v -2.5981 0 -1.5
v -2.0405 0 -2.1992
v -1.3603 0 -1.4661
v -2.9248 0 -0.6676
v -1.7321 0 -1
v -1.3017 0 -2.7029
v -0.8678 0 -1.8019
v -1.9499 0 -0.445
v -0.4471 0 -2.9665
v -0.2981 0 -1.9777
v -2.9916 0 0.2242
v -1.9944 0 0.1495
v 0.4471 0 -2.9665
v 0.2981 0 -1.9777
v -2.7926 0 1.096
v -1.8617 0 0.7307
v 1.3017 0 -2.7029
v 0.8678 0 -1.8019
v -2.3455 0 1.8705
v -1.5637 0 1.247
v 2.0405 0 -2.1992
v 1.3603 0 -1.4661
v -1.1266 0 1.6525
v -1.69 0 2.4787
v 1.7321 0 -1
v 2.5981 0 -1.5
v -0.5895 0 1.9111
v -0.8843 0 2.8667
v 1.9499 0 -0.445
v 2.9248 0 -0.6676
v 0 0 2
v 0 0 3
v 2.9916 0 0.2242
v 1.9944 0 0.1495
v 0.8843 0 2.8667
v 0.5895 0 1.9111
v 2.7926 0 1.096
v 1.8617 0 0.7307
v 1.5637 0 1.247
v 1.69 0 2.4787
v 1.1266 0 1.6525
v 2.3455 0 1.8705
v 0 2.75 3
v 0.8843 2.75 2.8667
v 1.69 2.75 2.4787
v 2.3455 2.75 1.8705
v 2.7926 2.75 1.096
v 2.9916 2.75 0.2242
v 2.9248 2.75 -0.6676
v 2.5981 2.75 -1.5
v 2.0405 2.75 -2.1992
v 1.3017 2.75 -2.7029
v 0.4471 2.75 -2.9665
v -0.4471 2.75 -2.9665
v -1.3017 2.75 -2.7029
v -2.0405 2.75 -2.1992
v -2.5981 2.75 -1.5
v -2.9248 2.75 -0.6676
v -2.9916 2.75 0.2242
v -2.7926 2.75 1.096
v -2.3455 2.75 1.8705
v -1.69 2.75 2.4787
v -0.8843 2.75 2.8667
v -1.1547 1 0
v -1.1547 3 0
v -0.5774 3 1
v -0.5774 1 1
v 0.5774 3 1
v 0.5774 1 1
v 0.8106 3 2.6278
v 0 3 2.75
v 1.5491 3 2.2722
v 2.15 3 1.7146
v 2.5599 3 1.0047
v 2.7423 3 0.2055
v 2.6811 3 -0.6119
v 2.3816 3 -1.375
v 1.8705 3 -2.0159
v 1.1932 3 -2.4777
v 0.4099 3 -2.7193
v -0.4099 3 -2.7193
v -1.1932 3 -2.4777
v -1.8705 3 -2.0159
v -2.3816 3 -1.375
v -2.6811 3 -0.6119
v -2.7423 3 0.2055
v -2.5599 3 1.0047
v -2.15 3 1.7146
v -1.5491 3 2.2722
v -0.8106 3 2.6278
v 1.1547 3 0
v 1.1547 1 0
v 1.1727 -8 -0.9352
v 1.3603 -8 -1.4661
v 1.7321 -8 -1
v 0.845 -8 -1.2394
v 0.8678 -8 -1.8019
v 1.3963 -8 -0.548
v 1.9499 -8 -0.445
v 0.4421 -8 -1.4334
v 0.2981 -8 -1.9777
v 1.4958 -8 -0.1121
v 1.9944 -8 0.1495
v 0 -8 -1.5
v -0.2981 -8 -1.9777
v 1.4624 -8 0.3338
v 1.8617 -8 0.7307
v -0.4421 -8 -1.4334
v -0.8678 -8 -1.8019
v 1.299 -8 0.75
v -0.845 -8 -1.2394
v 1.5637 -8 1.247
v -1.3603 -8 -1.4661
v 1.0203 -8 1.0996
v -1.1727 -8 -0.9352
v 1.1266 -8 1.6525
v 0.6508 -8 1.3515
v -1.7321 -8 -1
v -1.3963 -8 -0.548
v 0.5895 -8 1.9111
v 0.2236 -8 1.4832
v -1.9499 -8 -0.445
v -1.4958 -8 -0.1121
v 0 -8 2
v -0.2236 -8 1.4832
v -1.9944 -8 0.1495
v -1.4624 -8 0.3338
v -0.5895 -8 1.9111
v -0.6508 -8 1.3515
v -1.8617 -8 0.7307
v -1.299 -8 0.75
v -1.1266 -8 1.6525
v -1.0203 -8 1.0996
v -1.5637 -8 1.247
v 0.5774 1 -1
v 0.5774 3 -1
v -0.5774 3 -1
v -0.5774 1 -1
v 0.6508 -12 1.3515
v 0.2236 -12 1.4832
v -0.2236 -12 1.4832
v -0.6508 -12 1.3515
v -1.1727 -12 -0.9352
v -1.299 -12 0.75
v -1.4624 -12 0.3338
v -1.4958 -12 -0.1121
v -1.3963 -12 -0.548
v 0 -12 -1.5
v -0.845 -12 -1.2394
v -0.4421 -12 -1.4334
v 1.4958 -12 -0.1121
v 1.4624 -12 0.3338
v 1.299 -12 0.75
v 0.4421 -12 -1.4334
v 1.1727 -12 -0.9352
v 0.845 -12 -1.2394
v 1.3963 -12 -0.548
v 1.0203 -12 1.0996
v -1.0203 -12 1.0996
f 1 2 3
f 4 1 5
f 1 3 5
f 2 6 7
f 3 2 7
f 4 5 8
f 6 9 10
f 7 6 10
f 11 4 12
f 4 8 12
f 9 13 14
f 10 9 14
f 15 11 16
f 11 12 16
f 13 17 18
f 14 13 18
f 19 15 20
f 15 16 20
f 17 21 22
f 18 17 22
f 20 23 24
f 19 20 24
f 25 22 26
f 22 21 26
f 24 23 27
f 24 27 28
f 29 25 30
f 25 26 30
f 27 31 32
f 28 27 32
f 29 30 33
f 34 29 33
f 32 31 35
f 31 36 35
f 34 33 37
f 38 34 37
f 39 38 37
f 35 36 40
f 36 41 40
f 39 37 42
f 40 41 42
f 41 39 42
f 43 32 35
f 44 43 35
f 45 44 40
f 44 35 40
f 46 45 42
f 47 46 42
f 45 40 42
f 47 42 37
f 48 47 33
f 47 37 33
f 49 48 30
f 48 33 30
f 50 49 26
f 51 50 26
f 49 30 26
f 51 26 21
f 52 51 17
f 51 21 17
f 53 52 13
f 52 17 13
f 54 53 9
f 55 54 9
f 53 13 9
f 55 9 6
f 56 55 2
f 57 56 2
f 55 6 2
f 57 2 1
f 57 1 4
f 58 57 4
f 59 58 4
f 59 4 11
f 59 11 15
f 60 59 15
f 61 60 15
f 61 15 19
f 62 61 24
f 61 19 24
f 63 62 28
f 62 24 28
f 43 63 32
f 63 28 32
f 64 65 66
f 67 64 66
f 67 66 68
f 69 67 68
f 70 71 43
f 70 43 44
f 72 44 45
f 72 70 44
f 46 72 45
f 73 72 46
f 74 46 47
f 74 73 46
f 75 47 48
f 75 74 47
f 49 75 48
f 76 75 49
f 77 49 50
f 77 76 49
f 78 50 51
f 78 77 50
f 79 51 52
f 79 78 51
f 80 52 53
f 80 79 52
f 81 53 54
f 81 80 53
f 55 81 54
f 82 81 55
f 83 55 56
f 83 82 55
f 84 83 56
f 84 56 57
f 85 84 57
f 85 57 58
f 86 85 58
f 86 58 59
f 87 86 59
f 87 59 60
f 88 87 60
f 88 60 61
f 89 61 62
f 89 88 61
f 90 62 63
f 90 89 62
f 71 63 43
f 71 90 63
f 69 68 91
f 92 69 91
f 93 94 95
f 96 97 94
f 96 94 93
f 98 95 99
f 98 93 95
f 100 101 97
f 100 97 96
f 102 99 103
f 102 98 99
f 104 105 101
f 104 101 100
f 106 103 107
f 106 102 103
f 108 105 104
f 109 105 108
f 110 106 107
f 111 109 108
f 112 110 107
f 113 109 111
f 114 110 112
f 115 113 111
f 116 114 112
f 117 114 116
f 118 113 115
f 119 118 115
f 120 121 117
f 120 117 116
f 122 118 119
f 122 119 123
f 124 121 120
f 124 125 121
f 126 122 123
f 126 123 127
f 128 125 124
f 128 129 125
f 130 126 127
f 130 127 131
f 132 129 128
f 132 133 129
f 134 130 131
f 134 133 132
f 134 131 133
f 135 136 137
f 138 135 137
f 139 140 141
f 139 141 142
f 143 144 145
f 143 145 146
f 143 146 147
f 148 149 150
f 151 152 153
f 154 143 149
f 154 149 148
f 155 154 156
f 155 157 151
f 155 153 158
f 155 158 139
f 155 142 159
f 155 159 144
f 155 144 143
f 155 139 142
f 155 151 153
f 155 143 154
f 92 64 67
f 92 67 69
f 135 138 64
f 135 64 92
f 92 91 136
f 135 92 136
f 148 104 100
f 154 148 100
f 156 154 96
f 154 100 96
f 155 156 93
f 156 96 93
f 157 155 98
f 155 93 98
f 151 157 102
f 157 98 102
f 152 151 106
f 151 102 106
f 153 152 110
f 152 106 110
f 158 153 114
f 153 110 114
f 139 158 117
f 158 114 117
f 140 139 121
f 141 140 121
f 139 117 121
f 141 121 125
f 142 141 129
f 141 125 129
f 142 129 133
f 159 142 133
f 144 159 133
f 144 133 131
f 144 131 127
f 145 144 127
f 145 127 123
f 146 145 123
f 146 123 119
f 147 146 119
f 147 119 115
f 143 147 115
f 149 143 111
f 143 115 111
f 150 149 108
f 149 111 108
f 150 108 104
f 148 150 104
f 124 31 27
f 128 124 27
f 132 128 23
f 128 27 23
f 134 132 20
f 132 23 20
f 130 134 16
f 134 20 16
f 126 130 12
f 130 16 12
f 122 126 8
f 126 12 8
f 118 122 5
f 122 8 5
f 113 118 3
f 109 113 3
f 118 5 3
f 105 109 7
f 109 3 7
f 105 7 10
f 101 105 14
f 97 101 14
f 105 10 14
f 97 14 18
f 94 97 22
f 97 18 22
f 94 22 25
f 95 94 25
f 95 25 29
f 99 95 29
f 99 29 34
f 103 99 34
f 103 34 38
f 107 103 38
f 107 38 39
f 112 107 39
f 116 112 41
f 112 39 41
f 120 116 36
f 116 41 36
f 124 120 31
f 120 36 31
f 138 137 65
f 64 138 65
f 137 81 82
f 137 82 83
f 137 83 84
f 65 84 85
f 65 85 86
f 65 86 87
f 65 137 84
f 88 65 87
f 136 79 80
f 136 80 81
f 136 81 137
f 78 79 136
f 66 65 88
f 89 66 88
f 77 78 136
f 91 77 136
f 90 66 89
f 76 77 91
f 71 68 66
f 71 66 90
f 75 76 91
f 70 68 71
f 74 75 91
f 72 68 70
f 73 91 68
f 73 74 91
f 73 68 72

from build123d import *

# Parameters (mm, degrees)
SKETCH1_R           = 3
BOSS_EXTRUDE1_DEPTH = 3
SKETCH2_R           = 2
BOSS_EXTRUDE2_DEPTH = 8
SKETCH3_R           = 1.5
BOSS_EXTRUDE3_DEPTH = 4
CUT_EXTRUDE1_DEPTH  = 2
CHAMFER1_SIZE       = 0.25


with BuildPart() as part:
    # Sketch1 → Boss-Extrude1 (new body)
    with BuildSketch(Plane(origin=(0, 0, 0), x_dir=(1, 0, 0), z_dir=(0, 1, 0))):
        with Locations(Location((0, 0, 0), (0, 0, 270))):
            Circle(SKETCH1_R)
    extrude(amount=BOSS_EXTRUDE1_DEPTH)

    # Sketch2 → Boss-Extrude2 (add)
    with BuildSketch(Plane.XZ):
        with Locations(Location((0, 0, 0), (0, 0, 90))):
            Circle(SKETCH2_R)
    extrude(amount=BOSS_EXTRUDE2_DEPTH)

    # Sketch3 → Boss-Extrude3 (add)
    with BuildSketch(Plane.XZ.offset(8)):
        with Locations(Location((0, 0, 0), (0, 0, 270))):
            Circle(SKETCH3_R)
    extrude(amount=BOSS_EXTRUDE3_DEPTH)

    # Sketch4 → Cut-Extrude1 (cut)
    with BuildSketch(Plane(origin=(0, 3, 0), x_dir=(1, 0, 0), z_dir=(0, 1, 0))):
        Polygon((0.577350269, 1), (-0.577350269, 1), (-1.154700538, 0), (-0.577350269, -1), (0.577350269, -1), (1.154700538, 0), align=None)
    extrude(amount=-CUT_EXTRUDE1_DEPTH, mode=Mode.SUBTRACT)

    # Chamfer1
    chamfer1_edges = [part.edges().sort_by_distance(p)[0] for p in [
        (0, 3, -3),
    ]]
    chamfer(chamfer1_edges, length=CHAMFER1_SIZE)


solid = part.part
